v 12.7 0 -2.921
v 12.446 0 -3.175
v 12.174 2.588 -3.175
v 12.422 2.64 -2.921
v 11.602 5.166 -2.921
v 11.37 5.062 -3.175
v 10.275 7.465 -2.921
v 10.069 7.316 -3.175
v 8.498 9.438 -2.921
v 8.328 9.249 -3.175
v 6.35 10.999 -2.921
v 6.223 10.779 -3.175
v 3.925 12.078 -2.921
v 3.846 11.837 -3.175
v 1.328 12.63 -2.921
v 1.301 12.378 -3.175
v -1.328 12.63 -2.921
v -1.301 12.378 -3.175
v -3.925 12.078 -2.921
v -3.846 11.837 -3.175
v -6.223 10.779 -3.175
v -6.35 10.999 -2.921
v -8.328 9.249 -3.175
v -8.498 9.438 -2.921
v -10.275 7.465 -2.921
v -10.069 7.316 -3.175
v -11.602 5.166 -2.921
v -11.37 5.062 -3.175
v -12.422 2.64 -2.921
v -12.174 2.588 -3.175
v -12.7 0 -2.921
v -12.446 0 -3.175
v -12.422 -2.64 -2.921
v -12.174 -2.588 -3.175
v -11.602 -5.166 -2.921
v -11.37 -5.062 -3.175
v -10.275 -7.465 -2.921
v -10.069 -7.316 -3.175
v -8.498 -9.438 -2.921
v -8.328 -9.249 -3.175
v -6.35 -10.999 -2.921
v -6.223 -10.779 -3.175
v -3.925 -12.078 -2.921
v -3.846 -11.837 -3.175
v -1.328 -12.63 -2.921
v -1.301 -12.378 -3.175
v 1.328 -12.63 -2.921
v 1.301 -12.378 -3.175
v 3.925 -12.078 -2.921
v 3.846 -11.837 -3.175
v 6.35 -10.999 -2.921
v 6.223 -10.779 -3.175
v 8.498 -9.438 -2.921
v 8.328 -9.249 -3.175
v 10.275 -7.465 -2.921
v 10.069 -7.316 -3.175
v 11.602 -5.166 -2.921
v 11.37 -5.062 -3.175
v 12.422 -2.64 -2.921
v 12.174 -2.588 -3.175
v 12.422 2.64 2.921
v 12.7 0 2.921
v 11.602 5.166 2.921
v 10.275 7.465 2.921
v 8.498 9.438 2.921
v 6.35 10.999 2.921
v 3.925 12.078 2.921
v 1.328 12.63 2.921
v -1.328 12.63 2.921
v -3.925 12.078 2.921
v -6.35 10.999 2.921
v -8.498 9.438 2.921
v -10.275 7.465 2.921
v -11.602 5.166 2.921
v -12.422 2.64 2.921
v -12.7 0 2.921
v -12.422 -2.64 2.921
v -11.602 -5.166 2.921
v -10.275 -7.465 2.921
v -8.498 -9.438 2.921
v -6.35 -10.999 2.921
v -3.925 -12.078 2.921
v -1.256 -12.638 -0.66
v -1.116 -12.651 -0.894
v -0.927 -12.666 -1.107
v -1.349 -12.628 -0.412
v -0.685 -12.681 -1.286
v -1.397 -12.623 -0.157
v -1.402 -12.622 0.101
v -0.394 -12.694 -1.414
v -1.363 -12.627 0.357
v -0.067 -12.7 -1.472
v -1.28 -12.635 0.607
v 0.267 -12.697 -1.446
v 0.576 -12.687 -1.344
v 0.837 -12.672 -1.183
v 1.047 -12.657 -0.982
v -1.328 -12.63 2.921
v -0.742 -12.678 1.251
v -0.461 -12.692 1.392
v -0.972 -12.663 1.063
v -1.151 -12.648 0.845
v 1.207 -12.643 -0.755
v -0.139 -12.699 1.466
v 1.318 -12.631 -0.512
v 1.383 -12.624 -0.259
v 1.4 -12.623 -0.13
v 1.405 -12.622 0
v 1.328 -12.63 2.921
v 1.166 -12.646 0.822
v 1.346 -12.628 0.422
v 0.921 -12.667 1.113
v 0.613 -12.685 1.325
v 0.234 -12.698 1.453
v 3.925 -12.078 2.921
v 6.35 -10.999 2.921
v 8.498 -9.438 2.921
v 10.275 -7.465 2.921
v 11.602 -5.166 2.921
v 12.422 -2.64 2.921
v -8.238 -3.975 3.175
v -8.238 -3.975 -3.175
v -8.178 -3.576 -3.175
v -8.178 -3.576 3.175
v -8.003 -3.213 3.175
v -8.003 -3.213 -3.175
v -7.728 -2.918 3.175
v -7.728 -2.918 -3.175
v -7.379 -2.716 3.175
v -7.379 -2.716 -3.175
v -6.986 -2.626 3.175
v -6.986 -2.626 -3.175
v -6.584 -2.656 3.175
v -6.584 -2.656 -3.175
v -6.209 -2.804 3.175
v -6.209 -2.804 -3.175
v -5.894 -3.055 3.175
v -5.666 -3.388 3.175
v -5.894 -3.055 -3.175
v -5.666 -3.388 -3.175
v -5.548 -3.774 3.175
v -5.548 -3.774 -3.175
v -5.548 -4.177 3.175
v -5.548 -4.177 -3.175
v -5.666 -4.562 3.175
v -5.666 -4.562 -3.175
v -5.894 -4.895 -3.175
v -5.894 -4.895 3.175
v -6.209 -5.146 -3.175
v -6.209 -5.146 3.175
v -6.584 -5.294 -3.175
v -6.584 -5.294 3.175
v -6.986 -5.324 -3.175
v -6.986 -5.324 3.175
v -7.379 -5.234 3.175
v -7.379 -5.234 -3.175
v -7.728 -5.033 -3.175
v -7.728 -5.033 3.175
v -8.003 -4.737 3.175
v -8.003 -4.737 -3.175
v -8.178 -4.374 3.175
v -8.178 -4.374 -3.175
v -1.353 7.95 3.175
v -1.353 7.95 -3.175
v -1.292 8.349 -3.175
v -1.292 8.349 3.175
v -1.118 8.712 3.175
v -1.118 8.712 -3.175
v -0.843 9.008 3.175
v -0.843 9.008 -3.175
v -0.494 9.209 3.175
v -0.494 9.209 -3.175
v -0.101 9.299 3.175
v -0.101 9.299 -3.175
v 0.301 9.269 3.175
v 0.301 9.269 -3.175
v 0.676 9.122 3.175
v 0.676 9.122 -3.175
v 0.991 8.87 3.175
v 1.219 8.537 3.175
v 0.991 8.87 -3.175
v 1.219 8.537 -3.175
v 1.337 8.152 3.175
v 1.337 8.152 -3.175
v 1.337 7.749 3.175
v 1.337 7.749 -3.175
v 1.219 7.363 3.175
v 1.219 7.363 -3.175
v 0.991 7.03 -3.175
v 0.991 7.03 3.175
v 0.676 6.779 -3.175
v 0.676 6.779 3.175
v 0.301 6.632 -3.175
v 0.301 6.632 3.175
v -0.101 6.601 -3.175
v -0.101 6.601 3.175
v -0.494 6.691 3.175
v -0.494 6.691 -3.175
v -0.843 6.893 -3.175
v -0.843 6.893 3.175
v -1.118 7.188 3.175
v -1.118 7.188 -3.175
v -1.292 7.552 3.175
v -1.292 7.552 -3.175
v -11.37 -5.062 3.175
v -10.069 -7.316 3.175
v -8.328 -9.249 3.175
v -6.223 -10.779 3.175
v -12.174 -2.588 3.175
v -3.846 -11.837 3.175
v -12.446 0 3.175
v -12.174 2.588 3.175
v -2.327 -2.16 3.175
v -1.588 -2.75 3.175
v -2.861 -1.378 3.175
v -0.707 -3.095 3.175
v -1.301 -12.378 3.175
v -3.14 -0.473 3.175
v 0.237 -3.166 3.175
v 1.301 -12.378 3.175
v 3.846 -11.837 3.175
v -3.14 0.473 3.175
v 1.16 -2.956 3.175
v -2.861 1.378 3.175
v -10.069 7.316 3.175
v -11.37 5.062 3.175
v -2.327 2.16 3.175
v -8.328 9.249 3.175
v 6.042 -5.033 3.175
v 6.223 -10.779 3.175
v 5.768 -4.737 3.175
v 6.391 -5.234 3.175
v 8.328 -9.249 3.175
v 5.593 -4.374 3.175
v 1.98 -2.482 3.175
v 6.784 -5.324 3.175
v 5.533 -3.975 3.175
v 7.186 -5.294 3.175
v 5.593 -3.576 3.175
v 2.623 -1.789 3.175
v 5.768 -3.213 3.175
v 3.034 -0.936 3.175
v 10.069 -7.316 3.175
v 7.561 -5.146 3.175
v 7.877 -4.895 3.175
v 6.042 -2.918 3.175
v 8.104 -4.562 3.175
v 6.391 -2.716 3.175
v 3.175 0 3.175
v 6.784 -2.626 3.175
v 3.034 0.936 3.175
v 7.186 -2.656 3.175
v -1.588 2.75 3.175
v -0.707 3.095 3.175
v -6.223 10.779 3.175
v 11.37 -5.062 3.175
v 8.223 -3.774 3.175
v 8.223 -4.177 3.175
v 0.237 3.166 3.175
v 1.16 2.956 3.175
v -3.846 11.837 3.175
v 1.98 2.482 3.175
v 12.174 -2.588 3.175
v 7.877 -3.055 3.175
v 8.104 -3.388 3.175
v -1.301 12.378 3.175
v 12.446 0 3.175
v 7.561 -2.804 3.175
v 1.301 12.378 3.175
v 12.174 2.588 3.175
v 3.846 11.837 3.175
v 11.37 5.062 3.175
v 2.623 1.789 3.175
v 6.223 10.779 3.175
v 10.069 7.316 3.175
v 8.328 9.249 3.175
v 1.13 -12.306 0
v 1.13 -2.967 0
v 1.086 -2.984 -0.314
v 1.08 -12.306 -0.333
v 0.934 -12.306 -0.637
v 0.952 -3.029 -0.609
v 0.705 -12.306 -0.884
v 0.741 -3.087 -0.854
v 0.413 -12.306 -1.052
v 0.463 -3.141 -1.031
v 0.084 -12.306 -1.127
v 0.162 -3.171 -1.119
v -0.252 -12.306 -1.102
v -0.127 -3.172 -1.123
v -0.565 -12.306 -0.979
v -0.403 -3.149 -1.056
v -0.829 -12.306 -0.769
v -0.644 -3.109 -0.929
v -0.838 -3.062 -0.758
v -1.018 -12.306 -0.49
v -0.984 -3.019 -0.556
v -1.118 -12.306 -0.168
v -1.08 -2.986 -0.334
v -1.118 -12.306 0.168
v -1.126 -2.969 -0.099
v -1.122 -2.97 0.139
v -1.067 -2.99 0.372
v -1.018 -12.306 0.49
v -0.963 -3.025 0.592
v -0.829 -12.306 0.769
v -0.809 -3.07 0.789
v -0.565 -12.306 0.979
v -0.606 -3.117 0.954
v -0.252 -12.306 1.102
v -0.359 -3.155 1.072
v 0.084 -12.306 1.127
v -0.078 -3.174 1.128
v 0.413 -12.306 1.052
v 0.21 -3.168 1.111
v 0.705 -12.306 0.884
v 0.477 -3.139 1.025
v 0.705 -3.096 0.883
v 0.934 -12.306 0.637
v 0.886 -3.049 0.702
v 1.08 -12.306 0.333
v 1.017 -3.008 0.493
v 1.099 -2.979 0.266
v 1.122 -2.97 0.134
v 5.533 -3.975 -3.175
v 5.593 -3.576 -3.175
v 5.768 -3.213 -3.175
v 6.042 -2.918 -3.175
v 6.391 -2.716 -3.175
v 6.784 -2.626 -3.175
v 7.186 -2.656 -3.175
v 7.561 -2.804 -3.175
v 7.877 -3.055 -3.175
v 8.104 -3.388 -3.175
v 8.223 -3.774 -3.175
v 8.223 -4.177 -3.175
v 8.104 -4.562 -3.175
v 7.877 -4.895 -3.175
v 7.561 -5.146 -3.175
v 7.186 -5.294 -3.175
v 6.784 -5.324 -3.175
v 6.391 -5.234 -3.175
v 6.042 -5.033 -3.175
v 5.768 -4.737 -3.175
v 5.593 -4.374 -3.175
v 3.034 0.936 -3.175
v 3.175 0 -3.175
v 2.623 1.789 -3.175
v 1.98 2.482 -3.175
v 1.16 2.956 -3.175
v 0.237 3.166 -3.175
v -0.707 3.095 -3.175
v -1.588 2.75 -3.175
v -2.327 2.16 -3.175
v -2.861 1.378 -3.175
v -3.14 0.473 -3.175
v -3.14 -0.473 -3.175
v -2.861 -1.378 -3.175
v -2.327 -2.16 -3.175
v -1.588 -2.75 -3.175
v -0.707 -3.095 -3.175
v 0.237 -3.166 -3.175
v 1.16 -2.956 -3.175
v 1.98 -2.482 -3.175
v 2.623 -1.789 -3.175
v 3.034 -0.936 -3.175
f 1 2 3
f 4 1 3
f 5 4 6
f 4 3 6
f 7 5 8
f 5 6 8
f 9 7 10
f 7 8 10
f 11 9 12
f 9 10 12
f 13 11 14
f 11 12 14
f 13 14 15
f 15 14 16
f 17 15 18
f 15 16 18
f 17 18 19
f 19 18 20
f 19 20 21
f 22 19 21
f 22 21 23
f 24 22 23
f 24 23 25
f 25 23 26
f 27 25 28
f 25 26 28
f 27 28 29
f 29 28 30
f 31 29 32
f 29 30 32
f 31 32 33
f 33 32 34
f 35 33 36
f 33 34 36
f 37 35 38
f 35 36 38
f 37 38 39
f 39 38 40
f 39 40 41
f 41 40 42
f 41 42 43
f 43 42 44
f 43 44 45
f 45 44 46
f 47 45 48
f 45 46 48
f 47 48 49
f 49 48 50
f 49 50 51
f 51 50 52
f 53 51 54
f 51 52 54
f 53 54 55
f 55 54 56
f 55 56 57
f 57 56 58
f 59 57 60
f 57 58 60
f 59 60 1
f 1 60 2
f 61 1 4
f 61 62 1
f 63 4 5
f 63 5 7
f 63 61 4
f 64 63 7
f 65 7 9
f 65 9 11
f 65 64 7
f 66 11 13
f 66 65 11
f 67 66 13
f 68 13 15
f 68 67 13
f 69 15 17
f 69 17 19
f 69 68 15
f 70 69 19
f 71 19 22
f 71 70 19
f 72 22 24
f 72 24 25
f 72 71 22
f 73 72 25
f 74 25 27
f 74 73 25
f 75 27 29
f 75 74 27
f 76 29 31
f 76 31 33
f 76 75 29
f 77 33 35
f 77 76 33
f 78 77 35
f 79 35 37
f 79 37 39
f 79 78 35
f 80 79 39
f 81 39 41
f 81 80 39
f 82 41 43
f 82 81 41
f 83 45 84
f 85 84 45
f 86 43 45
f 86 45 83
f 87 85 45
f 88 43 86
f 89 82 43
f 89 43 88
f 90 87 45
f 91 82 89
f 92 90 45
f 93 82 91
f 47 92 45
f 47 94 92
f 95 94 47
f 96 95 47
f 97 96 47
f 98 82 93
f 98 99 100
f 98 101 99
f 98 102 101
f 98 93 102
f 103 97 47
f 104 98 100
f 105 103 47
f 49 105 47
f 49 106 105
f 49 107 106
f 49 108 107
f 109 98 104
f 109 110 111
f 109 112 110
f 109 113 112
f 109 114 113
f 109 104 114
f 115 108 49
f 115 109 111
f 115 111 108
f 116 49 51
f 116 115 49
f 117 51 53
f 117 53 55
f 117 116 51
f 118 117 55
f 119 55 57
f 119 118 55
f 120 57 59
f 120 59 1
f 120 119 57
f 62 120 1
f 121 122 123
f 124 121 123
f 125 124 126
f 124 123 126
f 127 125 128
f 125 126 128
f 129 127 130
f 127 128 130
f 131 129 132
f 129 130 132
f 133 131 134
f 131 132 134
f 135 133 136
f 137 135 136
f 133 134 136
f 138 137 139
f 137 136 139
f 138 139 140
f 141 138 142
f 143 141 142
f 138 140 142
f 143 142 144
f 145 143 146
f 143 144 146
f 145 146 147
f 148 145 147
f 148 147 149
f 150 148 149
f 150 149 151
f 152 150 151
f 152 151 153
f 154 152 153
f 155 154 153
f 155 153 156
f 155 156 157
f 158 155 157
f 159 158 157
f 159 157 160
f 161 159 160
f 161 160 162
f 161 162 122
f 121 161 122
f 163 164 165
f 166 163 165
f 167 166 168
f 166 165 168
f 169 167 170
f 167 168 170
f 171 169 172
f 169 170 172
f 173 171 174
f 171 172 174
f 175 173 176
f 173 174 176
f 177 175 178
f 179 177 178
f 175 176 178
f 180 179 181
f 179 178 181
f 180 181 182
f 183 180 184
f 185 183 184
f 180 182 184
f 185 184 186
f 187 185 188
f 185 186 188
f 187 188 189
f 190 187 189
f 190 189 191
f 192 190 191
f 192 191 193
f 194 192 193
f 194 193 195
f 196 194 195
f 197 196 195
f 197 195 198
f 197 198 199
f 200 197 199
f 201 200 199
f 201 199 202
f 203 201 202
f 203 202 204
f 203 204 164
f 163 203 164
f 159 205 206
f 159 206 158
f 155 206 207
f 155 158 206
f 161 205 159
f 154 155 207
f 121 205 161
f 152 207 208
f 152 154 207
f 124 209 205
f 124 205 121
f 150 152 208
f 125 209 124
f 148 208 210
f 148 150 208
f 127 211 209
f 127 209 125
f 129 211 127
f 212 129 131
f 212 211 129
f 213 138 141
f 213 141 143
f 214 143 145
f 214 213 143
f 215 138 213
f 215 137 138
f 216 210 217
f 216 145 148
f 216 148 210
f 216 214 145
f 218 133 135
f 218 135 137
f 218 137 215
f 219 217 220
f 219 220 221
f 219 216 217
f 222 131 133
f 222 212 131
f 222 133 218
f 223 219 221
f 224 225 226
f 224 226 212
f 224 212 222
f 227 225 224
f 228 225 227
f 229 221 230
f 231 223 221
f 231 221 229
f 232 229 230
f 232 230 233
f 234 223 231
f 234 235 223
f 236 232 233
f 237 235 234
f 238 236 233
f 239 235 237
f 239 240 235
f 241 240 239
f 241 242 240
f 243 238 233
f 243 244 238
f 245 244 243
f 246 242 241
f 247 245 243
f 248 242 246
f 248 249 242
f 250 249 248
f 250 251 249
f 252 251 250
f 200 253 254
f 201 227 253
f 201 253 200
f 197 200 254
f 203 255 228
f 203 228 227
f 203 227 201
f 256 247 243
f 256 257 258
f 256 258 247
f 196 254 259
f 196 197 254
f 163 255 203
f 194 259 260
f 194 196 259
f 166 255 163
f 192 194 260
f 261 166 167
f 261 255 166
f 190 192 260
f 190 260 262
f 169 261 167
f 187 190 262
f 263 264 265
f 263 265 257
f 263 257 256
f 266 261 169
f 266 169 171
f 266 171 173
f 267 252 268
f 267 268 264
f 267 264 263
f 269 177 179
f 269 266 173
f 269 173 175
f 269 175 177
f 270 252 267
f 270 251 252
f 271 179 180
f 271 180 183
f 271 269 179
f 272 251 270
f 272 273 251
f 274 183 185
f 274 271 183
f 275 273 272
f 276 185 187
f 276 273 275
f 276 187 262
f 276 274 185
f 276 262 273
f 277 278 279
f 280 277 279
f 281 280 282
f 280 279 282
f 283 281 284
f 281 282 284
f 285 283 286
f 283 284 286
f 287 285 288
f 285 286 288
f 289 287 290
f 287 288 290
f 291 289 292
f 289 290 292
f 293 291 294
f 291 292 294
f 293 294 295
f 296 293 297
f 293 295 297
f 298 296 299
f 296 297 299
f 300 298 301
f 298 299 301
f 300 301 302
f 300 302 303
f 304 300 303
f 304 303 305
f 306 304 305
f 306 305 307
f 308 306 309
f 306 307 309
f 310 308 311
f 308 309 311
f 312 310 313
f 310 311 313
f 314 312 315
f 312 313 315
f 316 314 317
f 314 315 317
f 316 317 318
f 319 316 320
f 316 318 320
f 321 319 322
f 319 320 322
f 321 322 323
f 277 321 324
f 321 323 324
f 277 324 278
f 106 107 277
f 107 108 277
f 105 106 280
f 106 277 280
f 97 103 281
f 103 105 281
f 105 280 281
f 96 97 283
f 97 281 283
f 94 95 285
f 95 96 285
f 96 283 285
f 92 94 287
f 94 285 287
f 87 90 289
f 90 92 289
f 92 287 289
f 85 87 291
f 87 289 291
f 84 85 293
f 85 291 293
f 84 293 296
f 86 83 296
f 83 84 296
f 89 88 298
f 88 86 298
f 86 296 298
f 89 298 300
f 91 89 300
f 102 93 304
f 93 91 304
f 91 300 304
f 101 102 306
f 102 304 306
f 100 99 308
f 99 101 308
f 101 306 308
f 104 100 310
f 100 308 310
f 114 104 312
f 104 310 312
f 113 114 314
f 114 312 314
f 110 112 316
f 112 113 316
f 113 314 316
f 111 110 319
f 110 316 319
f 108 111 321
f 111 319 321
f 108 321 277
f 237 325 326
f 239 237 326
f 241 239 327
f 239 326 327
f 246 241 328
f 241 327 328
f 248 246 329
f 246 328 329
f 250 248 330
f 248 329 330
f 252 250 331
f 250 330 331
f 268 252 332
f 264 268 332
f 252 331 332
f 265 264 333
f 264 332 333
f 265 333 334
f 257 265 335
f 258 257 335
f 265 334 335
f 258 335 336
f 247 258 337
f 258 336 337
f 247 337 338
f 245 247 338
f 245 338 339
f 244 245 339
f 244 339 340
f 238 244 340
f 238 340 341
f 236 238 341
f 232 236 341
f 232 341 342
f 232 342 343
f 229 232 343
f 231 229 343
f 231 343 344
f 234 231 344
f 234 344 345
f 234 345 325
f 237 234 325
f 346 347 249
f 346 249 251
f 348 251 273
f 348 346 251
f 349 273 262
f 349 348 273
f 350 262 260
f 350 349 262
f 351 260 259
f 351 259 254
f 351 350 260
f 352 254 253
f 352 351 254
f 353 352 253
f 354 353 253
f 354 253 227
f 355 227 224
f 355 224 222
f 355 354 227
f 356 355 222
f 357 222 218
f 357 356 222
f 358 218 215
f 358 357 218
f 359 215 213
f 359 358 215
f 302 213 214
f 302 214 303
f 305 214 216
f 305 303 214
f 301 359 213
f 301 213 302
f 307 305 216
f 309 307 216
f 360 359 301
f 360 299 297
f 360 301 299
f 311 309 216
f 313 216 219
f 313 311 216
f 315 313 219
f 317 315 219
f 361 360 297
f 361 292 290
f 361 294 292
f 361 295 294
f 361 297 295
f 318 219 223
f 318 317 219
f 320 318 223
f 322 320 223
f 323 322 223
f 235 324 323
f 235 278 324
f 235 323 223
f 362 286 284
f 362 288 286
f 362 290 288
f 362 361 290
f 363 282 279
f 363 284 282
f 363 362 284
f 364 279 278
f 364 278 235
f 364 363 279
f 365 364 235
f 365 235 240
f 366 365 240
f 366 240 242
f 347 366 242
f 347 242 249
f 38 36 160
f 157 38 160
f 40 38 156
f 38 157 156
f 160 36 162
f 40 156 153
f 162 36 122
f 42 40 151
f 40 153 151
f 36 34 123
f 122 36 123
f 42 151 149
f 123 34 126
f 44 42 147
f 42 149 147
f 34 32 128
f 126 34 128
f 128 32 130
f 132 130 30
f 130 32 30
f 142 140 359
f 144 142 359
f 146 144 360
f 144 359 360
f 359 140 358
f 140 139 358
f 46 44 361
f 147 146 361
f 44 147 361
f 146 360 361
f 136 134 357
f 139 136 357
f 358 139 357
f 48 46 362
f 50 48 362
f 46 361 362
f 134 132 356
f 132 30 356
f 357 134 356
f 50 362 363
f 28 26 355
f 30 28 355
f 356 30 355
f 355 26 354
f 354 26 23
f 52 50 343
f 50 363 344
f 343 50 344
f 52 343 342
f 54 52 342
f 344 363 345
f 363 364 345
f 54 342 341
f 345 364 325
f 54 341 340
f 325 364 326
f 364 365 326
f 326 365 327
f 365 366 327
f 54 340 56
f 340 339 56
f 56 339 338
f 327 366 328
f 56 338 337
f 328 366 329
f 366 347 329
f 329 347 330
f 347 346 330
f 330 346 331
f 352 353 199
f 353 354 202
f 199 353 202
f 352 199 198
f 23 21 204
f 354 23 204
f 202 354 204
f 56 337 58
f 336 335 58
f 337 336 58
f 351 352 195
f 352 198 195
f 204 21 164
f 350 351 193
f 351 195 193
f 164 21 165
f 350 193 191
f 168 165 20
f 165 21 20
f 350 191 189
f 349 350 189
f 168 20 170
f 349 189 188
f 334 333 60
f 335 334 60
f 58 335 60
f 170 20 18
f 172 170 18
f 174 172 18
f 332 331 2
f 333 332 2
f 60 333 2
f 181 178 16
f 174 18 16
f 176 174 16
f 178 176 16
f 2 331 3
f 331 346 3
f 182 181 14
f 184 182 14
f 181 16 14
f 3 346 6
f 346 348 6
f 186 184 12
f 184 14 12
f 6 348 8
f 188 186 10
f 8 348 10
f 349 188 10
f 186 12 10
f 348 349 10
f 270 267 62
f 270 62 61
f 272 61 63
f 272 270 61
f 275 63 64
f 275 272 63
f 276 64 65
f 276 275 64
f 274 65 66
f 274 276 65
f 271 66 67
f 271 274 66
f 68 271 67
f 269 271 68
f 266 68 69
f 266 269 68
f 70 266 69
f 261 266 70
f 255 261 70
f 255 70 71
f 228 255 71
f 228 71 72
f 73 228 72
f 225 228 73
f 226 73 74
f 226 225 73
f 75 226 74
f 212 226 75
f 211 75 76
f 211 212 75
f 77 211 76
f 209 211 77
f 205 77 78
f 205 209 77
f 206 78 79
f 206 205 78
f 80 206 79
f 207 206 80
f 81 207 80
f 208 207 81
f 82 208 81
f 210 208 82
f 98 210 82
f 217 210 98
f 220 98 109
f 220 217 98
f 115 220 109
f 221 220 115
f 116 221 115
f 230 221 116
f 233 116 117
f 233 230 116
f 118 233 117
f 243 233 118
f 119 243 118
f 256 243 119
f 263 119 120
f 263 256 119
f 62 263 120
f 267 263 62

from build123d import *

# Parameters (mm, degrees)
SKETCH2_R             = 12.7
SKETCH2_R_2           = 3.175
BOSS_EXTRUDE1_DEPTH   = 3.175
CHAMFER1_SIZE         = 0.254
F_6_32_TAPPED_HOLE1_D = 2.7051


# Read off the part's stored shape, not the designer's step: #4-40 Tapped Hole2
with BuildPart() as part:
    # Sketch2 → Boss-Extrude1 (new, symmetric)
    with BuildSketch(Plane.XY):
        Circle(SKETCH2_R)
        Circle(SKETCH2_R_2, mode=Mode.SUBTRACT)
    extrude(amount=BOSS_EXTRUDE1_DEPTH, both=True)

    # Chamfer1
    chamfer1_edges = [part.edges().sort_by_distance(p)[0] for p in [
        (-12.7, 0, -3.175),
        (-12.7, 0, 3.175),
    ]]
    chamfer(chamfer1_edges, length=CHAMFER1_SIZE)

    # #6-32 Tapped Hole1 (through all)
    with Locations(Plane.XY.offset(3.175)):
        with Locations((0, 7.9502), (6.885075165, -3.9751), (-6.885075165, -3.9751)):
            Hole(F_6_32_TAPPED_HOLE1_D / 2)

    # #4-40 Tapped Hole2 outline → #4-40 Tapped Hole2 (revolve, cut)
    with BuildSketch(Plane.XY):
        Polygon((0, -12.700018831), (1.473216369, -12.700018831), (1.1303, -12.305538673), (1.1303, -2.966966147), (0, -2.966966147), align=None)
    revolve(axis=Axis((0, 0, 0), (0, 1, 0)), mode=Mode.SUBTRACT)


solid = part.part
